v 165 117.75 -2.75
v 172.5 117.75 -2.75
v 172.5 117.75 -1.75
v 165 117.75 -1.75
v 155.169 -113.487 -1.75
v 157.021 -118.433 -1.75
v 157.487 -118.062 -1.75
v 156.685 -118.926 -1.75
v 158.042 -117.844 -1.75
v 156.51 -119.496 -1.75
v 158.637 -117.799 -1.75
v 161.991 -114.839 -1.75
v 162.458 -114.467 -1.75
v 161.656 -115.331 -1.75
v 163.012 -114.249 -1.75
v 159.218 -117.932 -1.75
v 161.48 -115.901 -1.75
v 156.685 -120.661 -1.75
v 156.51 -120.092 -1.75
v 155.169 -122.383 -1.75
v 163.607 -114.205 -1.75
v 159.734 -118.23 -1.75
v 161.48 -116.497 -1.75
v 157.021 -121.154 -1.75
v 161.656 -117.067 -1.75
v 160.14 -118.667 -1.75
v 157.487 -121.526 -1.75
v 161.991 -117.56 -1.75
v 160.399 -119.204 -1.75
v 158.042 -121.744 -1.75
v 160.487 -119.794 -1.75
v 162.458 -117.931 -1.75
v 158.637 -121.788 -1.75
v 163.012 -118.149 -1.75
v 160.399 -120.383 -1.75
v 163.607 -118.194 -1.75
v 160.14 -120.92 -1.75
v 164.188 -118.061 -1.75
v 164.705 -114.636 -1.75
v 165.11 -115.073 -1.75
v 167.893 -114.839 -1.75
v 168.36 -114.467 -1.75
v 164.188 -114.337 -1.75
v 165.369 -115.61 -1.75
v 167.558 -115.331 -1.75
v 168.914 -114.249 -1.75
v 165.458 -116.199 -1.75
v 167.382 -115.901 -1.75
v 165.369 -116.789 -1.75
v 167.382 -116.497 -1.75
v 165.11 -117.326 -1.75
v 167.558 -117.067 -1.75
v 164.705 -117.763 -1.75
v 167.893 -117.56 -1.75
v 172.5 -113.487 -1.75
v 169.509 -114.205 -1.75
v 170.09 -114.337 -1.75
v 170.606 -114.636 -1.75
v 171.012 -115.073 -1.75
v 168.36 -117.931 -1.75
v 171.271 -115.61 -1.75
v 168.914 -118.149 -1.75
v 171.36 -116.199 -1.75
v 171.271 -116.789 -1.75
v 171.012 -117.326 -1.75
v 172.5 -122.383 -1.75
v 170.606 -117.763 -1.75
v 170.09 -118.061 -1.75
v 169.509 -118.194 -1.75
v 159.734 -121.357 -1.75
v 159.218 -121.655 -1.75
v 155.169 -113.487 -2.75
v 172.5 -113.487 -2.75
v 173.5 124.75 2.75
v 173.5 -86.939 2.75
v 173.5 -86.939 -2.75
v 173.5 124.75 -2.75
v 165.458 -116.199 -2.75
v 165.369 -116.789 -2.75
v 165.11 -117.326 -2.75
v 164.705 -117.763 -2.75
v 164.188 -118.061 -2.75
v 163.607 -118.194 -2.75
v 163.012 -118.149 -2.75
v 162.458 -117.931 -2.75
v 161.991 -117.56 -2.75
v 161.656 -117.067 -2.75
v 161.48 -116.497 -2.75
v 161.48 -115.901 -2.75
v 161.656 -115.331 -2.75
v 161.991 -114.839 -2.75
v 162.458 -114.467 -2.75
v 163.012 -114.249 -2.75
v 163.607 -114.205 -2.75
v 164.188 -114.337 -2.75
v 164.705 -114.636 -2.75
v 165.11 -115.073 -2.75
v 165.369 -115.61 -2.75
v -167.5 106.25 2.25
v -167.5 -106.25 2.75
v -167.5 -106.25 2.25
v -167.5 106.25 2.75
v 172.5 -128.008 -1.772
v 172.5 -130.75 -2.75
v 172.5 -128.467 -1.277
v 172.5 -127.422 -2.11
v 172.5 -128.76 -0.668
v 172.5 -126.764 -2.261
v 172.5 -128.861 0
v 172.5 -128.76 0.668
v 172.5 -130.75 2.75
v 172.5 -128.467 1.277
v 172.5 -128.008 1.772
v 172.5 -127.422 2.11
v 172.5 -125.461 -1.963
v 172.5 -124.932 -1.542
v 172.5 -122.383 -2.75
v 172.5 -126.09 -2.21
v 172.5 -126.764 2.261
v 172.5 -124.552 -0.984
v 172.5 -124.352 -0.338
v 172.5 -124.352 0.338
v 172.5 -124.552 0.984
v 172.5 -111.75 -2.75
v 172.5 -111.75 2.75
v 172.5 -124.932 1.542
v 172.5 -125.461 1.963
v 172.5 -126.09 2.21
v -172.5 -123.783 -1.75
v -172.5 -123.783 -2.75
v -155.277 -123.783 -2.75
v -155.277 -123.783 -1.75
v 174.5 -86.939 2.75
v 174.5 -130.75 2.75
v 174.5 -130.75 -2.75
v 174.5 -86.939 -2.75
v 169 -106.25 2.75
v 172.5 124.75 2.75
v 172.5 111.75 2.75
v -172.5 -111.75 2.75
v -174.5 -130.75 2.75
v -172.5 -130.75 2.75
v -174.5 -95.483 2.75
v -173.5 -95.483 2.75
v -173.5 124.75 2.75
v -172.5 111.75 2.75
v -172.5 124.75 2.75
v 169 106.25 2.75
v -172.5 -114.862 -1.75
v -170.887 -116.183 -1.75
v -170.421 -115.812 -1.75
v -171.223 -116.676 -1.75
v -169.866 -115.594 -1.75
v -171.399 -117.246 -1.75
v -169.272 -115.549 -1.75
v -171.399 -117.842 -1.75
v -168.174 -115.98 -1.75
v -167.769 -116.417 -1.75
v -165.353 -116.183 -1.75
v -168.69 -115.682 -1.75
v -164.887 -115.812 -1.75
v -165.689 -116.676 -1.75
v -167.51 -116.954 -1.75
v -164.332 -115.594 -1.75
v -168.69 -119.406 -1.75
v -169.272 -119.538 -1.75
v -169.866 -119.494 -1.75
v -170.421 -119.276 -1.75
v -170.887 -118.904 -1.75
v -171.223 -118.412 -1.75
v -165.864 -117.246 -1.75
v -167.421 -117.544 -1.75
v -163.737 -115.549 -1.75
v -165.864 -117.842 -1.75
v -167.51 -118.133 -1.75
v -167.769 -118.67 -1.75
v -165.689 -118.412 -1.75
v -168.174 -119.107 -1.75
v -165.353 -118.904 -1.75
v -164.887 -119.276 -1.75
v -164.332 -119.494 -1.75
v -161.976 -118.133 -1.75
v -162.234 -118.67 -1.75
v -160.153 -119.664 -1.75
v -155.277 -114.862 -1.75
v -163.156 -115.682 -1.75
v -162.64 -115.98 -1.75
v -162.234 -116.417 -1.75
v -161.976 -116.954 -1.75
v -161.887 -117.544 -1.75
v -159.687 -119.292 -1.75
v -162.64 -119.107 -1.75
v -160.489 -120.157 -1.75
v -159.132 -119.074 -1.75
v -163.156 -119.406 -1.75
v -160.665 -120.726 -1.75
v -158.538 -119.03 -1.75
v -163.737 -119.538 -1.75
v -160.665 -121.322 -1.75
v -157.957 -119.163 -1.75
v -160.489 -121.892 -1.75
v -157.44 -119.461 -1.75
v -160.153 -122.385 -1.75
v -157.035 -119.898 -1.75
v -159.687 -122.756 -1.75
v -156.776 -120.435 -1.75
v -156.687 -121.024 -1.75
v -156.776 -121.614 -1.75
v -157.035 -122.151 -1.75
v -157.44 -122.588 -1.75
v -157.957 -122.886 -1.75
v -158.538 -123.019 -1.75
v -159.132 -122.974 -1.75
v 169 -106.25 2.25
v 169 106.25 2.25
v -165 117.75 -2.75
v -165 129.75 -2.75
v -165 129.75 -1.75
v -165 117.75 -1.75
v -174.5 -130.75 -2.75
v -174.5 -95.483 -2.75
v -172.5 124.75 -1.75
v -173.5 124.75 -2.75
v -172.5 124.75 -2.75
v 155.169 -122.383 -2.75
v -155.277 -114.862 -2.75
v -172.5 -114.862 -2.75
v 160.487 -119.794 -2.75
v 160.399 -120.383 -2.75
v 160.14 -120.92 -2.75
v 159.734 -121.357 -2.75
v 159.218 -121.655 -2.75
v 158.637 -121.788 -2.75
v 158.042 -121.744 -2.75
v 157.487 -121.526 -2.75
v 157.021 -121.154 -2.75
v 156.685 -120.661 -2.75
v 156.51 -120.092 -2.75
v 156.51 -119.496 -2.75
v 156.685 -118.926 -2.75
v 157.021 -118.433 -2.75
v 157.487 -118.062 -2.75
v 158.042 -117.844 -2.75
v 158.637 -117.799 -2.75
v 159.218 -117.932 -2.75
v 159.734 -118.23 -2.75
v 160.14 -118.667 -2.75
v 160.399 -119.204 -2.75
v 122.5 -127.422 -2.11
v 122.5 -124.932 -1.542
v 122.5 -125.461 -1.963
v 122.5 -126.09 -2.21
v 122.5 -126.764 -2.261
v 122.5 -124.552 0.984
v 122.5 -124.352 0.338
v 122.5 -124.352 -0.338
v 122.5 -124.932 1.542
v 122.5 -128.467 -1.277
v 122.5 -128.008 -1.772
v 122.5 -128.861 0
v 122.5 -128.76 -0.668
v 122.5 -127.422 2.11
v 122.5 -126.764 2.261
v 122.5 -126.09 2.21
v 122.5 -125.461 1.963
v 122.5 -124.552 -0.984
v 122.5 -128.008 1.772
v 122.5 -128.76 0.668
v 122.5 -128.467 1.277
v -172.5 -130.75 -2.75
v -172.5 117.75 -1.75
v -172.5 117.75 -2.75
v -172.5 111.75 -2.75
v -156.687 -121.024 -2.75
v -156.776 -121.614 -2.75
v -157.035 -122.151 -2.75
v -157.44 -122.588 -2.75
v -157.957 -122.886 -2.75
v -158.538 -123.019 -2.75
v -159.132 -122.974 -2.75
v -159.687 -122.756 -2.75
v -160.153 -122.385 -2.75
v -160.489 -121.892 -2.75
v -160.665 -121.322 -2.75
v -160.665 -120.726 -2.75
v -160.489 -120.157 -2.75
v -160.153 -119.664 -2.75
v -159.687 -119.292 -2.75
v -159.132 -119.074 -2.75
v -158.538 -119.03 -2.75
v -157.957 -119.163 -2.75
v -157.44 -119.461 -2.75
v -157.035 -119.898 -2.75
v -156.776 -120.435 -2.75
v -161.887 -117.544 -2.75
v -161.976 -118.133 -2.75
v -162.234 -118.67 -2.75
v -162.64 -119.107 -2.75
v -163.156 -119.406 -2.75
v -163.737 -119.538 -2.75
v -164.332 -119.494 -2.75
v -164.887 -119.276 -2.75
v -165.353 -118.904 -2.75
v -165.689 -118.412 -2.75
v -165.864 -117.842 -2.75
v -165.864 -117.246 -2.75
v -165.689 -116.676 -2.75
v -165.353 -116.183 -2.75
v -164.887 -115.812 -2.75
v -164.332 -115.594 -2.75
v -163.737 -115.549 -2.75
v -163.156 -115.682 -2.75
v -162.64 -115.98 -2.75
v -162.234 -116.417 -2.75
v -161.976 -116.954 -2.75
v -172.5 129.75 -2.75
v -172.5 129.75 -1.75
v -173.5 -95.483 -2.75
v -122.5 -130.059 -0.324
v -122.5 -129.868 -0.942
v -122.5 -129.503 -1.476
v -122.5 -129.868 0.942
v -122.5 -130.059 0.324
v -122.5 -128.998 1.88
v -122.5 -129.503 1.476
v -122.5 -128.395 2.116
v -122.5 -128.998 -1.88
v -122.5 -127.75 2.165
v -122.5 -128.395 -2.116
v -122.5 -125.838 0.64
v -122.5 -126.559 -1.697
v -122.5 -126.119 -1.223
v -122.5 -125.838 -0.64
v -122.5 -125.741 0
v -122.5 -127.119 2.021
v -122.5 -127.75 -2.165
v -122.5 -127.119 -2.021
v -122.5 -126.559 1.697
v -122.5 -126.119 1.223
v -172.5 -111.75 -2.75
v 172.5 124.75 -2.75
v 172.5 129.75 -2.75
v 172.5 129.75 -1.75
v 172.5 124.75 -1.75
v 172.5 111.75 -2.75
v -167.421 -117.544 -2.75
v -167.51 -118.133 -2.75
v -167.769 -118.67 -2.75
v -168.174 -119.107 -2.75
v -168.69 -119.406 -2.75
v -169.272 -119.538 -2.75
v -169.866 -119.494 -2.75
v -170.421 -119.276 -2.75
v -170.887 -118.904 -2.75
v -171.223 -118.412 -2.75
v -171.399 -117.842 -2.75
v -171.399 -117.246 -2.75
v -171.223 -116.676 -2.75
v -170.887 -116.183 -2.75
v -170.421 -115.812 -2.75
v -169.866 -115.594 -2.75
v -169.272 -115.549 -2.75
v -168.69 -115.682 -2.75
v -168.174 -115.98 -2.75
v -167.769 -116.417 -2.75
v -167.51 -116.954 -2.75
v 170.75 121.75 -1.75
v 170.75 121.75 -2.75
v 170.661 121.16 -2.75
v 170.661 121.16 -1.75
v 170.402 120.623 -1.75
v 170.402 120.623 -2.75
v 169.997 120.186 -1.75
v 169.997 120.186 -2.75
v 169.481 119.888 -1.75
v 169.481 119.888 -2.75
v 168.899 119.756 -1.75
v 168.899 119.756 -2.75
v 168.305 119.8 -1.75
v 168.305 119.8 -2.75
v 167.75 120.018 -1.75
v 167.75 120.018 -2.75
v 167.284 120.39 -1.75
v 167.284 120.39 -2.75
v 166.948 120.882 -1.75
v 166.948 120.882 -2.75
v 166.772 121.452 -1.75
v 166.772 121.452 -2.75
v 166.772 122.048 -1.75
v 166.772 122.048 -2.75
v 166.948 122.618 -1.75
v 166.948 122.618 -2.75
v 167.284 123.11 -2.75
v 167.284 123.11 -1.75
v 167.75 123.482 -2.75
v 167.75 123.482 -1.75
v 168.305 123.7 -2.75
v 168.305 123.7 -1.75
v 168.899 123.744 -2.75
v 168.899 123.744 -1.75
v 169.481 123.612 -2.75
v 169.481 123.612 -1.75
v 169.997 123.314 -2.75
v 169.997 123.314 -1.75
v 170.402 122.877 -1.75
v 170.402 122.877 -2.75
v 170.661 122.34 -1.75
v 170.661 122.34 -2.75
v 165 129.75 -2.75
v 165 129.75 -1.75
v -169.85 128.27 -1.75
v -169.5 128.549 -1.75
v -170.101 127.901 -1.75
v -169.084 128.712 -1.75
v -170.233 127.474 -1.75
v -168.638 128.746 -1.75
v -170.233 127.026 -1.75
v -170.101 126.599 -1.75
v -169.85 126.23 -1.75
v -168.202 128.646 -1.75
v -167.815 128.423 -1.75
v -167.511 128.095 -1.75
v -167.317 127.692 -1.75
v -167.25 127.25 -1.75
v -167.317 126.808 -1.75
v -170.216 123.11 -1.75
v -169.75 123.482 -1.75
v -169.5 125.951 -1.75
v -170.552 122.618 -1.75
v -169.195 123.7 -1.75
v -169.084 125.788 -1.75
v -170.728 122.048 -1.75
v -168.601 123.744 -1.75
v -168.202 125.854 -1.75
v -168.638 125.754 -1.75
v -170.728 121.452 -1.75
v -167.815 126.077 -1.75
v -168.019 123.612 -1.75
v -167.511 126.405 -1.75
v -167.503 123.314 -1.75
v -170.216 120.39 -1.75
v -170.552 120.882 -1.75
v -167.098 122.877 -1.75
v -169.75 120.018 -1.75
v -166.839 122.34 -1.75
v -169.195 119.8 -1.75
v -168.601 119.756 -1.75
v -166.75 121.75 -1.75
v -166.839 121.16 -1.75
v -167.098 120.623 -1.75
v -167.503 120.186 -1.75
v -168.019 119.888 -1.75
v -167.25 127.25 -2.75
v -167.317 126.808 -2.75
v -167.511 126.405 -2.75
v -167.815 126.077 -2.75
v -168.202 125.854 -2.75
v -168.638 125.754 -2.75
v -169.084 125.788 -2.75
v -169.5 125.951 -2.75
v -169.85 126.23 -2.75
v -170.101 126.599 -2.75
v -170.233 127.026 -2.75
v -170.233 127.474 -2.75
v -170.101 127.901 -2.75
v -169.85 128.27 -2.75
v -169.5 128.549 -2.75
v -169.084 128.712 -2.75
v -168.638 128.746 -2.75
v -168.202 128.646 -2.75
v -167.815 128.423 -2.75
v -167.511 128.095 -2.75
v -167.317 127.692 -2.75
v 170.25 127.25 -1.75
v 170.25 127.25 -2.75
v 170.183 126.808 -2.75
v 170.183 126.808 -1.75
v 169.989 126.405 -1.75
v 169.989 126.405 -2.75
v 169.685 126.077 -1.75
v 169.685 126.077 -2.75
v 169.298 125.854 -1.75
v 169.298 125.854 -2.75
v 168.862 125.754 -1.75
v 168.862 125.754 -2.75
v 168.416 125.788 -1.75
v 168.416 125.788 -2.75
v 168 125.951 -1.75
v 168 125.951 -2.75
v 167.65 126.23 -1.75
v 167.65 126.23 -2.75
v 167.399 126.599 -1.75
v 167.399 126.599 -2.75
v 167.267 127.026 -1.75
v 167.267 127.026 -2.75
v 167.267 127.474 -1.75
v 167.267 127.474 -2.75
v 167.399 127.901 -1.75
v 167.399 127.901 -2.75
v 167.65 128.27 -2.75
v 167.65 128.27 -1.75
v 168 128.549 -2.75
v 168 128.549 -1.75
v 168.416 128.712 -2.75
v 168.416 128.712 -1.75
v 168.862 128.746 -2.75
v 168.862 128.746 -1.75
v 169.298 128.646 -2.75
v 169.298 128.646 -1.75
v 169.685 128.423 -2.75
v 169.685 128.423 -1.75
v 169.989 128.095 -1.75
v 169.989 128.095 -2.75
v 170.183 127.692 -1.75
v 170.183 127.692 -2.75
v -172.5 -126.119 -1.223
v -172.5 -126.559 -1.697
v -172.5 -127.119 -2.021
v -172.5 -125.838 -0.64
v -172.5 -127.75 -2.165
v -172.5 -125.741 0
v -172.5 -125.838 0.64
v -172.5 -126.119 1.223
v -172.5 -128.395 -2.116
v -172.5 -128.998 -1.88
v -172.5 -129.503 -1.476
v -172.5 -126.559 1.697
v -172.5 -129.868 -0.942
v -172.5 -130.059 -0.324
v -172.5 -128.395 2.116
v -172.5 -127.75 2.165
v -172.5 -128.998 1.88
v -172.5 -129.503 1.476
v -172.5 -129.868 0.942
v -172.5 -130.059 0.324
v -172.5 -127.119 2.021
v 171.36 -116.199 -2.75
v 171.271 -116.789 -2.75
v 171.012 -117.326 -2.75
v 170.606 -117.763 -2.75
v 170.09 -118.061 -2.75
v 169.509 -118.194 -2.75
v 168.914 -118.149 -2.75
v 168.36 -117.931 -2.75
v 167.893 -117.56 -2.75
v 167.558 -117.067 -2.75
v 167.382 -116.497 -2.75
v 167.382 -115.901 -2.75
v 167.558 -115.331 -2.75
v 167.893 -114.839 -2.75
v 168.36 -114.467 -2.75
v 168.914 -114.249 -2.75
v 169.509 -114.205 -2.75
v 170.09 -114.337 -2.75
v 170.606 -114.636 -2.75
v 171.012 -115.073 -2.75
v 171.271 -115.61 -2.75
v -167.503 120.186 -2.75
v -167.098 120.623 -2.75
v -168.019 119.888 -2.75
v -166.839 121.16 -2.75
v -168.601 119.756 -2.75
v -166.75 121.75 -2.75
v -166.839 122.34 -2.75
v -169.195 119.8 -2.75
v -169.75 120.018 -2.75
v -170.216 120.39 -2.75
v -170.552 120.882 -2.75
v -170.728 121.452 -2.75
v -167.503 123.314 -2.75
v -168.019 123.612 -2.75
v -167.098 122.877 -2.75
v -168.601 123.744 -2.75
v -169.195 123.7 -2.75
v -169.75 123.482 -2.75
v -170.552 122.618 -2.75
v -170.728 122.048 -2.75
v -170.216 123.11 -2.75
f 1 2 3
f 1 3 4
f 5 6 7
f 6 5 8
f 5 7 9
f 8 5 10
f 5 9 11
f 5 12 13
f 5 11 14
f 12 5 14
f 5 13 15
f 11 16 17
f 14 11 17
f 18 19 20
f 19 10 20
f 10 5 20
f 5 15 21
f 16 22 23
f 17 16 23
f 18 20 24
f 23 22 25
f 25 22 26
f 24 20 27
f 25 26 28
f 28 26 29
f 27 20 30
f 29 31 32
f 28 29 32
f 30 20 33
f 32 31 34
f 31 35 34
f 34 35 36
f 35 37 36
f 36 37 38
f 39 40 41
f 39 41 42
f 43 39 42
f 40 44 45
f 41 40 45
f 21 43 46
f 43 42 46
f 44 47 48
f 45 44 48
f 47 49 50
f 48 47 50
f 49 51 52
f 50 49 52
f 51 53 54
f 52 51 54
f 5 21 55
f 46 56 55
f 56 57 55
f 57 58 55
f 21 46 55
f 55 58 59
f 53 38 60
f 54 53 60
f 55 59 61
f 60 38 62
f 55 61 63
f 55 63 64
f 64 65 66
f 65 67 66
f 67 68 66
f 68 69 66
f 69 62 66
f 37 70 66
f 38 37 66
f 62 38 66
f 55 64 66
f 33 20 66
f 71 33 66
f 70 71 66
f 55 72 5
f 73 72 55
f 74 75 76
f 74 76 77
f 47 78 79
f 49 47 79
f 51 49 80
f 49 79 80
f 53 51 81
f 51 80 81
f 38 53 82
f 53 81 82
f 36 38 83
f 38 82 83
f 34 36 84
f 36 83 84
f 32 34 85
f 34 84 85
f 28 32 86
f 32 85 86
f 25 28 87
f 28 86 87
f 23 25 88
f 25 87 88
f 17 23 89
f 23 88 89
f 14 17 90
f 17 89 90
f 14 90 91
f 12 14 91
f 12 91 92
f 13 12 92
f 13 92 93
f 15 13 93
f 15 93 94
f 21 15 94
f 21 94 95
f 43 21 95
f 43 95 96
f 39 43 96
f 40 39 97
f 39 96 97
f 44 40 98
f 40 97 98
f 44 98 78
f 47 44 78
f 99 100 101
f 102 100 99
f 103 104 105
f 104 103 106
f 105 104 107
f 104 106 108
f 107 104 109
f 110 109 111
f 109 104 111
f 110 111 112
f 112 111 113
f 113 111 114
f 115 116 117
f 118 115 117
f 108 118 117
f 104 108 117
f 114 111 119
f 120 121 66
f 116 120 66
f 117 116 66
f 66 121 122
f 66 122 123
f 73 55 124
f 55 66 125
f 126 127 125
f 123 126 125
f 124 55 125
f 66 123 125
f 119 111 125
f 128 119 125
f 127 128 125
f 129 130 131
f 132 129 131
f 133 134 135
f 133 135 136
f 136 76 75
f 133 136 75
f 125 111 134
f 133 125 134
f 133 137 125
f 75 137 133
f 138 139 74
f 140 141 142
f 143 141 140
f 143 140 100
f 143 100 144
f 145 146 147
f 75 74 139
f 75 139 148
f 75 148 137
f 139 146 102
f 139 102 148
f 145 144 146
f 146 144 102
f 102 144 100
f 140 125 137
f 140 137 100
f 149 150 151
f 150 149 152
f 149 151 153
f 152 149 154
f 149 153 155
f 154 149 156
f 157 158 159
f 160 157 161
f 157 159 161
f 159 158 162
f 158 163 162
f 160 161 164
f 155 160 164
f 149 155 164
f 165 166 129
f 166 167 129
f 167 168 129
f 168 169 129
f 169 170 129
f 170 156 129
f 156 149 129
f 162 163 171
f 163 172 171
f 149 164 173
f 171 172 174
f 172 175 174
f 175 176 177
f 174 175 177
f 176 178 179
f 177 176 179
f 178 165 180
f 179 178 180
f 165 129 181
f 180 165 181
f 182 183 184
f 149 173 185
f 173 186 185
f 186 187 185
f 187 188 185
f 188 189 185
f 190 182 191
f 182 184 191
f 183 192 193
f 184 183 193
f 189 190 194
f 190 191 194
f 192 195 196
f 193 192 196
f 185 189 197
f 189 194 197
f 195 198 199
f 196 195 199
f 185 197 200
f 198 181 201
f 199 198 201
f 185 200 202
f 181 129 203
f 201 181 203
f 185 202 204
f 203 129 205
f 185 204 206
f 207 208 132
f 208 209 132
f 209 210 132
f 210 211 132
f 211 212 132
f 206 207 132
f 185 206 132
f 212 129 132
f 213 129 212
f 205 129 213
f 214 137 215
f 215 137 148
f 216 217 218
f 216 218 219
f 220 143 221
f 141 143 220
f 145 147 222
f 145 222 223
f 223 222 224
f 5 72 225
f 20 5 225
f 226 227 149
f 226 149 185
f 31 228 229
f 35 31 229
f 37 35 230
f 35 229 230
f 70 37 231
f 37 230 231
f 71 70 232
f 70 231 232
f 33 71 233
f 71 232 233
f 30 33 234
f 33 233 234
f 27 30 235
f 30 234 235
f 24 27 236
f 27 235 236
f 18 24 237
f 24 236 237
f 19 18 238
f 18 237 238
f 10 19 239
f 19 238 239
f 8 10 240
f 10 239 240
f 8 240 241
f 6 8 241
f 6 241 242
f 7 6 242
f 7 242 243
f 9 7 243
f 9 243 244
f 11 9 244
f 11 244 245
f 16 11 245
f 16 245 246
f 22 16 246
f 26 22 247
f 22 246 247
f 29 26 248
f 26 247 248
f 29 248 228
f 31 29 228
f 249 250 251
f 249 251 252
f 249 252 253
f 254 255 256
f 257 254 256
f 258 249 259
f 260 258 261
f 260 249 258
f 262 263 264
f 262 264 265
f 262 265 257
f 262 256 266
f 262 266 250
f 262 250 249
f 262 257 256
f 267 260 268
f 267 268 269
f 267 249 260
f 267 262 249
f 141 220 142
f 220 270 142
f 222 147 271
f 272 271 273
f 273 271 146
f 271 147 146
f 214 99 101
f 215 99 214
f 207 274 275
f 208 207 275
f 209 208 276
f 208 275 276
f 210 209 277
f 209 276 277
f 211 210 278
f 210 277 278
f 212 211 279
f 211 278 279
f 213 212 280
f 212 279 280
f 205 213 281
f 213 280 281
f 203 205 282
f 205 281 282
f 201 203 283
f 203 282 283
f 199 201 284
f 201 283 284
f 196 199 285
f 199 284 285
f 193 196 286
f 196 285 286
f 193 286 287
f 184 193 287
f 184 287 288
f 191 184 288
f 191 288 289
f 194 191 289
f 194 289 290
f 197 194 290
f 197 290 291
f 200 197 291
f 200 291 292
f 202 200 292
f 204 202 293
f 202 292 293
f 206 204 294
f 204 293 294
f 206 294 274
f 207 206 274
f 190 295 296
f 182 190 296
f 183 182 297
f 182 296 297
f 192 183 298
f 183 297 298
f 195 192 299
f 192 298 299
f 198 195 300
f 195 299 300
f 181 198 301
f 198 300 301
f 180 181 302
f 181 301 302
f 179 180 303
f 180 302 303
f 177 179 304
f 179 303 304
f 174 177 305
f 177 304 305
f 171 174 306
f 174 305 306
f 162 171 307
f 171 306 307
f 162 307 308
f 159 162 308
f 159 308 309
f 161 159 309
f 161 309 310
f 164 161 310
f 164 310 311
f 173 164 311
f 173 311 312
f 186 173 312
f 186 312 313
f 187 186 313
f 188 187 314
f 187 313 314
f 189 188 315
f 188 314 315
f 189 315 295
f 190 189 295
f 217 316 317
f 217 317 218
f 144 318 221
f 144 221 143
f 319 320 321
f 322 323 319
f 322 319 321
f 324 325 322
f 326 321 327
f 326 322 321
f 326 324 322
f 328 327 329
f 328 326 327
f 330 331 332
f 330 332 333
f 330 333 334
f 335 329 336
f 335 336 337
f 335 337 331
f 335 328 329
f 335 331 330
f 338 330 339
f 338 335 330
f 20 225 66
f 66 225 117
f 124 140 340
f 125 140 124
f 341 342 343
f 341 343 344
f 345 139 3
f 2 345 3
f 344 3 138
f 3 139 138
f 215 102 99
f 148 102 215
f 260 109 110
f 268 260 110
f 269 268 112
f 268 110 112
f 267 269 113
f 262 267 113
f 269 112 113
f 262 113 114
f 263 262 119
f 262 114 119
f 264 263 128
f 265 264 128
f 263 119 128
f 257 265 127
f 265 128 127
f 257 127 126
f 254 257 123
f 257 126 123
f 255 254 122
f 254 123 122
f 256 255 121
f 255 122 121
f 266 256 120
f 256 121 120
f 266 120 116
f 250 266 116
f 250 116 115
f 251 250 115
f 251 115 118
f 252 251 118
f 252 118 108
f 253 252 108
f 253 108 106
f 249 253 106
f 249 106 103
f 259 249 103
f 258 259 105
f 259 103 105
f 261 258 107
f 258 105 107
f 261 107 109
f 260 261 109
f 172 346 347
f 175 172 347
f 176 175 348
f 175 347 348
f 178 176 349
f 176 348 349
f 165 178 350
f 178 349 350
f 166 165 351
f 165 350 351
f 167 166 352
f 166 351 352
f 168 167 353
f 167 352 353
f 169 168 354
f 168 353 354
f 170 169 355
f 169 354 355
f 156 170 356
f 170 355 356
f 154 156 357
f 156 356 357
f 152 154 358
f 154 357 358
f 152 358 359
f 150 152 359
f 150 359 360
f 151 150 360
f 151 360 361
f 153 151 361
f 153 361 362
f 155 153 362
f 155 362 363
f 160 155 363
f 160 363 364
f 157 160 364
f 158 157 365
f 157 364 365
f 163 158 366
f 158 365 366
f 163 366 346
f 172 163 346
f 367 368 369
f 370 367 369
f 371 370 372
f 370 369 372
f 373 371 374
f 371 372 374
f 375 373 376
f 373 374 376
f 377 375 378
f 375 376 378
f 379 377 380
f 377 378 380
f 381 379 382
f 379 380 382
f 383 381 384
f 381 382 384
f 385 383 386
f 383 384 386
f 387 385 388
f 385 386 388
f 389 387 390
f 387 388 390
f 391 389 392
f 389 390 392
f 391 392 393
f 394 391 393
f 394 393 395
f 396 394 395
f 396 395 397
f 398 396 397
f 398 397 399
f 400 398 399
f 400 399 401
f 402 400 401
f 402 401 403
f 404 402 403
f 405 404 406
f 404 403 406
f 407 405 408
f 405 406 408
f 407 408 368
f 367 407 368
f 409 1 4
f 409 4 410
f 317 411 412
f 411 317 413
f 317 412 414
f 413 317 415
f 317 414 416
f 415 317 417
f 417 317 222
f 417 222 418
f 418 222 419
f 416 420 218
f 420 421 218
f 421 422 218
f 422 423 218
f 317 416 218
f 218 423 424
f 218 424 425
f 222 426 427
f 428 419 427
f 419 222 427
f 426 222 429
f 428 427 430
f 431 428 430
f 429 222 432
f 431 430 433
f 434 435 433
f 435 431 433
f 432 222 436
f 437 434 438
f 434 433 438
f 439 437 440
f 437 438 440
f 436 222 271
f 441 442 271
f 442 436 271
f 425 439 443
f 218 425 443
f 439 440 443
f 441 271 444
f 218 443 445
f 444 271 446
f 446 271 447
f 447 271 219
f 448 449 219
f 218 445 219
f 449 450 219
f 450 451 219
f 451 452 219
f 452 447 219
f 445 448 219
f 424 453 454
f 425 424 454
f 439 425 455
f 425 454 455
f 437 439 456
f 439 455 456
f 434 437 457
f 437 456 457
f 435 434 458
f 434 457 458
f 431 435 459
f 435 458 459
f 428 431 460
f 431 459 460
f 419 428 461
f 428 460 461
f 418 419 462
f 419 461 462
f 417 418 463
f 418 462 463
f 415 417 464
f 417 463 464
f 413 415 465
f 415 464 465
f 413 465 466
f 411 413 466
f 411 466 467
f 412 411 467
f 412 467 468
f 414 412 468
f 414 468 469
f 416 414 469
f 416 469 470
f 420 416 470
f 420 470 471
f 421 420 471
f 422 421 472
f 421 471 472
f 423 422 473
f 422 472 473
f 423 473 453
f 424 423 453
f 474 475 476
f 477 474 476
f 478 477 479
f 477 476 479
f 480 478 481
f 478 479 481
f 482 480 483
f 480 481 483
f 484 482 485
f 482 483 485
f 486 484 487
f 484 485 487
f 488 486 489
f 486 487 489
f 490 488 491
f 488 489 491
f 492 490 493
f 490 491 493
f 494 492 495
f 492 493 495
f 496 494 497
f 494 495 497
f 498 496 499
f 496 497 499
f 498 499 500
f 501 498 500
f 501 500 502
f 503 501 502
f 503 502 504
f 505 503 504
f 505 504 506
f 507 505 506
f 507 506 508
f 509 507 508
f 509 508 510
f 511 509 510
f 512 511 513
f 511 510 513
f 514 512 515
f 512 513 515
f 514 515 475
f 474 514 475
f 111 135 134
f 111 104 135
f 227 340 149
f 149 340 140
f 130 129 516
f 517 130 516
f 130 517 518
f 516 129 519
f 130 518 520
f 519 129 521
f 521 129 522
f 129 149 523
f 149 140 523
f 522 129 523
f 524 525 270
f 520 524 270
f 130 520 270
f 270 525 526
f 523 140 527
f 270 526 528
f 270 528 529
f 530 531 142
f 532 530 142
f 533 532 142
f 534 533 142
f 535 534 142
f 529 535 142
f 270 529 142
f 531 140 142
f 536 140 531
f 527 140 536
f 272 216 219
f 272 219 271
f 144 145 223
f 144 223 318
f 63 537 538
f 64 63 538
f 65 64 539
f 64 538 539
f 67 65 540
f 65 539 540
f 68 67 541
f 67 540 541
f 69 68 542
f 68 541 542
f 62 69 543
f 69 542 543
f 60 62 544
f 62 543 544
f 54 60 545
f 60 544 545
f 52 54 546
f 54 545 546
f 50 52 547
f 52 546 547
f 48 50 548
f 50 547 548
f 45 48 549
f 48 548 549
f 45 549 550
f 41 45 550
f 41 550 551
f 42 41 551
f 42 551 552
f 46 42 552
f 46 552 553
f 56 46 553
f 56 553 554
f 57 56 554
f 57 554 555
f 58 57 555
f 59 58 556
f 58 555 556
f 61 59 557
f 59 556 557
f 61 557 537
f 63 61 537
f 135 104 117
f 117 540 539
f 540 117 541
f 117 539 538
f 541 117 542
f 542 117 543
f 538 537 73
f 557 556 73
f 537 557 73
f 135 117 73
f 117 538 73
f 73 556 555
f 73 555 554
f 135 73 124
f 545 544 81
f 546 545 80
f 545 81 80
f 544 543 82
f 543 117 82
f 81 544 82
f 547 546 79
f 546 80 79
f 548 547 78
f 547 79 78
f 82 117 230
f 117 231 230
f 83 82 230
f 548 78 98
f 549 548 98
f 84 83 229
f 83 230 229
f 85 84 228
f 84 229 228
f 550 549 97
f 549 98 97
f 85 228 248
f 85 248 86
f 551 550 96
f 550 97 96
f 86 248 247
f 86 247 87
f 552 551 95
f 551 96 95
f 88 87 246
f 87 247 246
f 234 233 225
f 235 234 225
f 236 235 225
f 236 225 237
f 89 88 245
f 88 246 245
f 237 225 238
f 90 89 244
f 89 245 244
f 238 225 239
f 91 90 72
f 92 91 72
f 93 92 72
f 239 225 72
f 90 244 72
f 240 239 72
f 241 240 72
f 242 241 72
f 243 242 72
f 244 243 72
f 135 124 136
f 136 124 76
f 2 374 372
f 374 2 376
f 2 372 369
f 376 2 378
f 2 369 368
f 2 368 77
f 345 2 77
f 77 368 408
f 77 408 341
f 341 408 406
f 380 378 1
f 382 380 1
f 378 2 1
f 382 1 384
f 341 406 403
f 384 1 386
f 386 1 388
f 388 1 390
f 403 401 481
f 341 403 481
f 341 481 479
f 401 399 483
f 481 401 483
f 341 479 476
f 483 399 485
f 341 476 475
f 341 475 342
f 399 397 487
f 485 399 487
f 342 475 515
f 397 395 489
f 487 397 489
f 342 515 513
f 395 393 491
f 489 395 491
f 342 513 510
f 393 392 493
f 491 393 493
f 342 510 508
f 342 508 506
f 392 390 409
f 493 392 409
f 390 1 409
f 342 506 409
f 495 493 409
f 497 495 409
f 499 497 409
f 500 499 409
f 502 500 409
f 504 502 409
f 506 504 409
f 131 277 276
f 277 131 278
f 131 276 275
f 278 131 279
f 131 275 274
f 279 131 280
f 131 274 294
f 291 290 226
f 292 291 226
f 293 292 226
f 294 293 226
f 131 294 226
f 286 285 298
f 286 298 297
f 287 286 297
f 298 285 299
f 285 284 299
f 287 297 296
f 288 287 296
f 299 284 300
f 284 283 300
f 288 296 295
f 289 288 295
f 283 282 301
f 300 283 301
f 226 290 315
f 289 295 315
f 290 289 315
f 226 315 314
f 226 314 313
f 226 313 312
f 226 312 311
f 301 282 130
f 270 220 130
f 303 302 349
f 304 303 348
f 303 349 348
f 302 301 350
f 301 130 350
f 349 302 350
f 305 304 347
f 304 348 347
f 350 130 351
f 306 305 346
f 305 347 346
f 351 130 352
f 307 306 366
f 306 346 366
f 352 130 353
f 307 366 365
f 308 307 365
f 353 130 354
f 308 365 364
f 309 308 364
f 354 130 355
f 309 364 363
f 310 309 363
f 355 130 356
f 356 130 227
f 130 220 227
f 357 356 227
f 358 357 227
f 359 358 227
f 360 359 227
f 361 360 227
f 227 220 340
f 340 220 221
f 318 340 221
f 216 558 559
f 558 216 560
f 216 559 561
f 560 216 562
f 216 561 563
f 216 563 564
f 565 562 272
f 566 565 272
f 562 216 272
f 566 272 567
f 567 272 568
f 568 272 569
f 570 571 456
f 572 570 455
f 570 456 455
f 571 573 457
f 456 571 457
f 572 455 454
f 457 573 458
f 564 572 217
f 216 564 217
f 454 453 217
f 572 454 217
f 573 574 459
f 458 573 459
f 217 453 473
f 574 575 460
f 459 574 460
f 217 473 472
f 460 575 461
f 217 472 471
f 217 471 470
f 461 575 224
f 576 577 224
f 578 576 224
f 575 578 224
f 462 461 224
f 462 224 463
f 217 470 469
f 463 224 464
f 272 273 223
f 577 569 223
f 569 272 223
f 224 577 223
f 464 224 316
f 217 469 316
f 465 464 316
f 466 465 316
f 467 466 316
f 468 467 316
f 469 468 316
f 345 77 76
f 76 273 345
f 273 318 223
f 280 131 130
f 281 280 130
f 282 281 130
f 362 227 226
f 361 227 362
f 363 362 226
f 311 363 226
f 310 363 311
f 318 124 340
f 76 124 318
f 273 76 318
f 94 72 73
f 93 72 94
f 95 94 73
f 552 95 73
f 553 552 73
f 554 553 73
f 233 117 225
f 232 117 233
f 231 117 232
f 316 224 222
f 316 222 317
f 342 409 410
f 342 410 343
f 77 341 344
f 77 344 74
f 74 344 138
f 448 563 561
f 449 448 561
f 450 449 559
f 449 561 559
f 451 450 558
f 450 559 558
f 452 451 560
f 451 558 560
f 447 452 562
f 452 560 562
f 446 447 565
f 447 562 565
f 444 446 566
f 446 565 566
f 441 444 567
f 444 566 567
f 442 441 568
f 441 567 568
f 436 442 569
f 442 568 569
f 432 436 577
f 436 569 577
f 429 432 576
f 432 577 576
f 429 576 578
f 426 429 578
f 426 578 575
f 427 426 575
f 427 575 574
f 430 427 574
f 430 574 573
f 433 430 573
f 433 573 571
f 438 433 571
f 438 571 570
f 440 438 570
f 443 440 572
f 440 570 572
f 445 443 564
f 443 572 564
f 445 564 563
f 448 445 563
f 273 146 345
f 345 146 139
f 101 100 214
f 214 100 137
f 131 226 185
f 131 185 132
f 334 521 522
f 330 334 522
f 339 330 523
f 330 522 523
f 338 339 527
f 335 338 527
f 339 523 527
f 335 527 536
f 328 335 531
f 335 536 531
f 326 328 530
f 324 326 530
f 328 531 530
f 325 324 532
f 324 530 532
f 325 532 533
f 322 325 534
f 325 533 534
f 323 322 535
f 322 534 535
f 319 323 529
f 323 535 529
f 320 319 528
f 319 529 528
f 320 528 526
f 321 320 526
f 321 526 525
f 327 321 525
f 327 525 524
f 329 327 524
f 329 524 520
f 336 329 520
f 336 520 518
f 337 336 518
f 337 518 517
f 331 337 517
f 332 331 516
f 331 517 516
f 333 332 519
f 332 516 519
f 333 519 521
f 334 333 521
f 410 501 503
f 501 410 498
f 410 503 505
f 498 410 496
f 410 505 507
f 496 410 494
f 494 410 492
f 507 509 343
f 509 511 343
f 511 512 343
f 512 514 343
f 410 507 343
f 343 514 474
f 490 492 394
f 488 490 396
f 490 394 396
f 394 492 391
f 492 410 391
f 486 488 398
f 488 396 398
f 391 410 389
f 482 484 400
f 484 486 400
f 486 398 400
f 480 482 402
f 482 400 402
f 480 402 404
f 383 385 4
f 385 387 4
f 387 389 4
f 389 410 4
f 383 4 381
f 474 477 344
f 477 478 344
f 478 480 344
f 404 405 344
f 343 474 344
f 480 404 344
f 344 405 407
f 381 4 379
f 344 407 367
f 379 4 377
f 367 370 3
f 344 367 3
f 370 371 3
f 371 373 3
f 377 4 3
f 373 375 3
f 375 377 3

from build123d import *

# Parameters (mm, degrees)
F0_W      = 345
F0_H      = 223.5
F1_DEPTH  = 2.75
F2_W      = 336.5
F2_H      = 212.5
F3_DEPTH  = 0.5
F5_DEPTH  = 1
F7_DEPTH  = 1
F8_R      = 1.5
F8_R_2    = 2
F9_DEPTH  = 1
F10_R     = 1.5
F10_R_2   = 2
F11_DEPTH = 1
F12_W     = 35.267069459
F12_H     = 5.5
F13_DEPTH = 1
F14_W     = 17.2233697499
F14_H     = 8.9206725706
F14_R     = 2
F15_DEPTH = 1
F16_R     = 2.1707267793
F17_DEPTH = 50
F18_W     = 43.8106725812
F18_H     = 5.5
F19_DEPTH = 1
F20_W     = 17.3314685191
F20_H     = 8.8958692735
F20_R     = 2
F21_DEPTH = 1
F22_R     = 2.2669992326
F23_DEPTH = 50


with BuildPart() as f1:
    # F0 (on Top) → F1 (new body, symmetric)
    with BuildSketch(Plane.XY):
        Rectangle(F0_W, F0_H)
    extrude(amount=F1_DEPTH, both=True)

    # F2 (on face) → F3 (cut)
    with BuildSketch(Plane.XY.offset(2.75)):
        with Locations((0.75, 0)):
            Rectangle(F2_W, F2_H)
    extrude(amount=-F3_DEPTH, mode=Mode.SUBTRACT)

    # F4 (on face) → F5 (join)
    with BuildSketch(Plane(origin=(-172.5, 0, 0), x_dir=(0, -1, 0), z_dir=(-1, 0, 0))):
        Polygon((-111.75, 2.75), (-124.75, 2.75), (-124.75, -2.75), (-111.75, -2.75), (111.75, -2.75), (130.75, -2.75), (130.75, 2.75), (111.75, 2.75), align=None)
    extrude(amount=F5_DEPTH)

    # F6 (on face) → F7 (join)
    with BuildSketch(Plane.YZ.offset(172.5)):
        Polygon((124.75, 2.75), (111.75, 2.75), (-111.75, 2.75), (-130.75, 2.75), (-130.75, -2.75), (-111.75, -2.75), (111.75, -2.75), (124.75, -2.75), align=None)
    extrude(amount=F7_DEPTH)

    # F8 (on face) → F9 (join)
    with BuildSketch(Plane(origin=(0, 0, -2.75), x_dir=(1, 0, 0), z_dir=(0, 0, -1))):
        Polygon((-172.5, -117.75), (-172.5, -124.75), (-172.5, -129.75), (-165, -129.75), (-165, -117.75), align=None)
        with Locations((-168.75, -127.25)):
            Circle(F8_R, mode=Mode.SUBTRACT)
        with Locations((-168.75, -121.75)):
            Circle(F8_R_2, mode=Mode.SUBTRACT)
    extrude(amount=-F9_DEPTH)

    # F10 (on face) → F11 (join)
    with BuildSketch(Plane(origin=(0, 0, -2.75), x_dir=(1, 0, 0), z_dir=(0, 0, -1))):
        Polygon((165, -117.75), (165, -129.75), (172.5, -129.75), (172.5, -124.75), (172.5, -117.75), align=None)
        with Locations((168.75, -127.25)):
            Circle(F10_R, mode=Mode.SUBTRACT)
        with Locations((168.75, -121.75)):
            Circle(F10_R_2, mode=Mode.SUBTRACT)
    extrude(amount=-F11_DEPTH)

    # F12 (on face) → F13 (join)
    with BuildSketch(Plane(origin=(-173.5, 0, 0), x_dir=(0, -1, 0), z_dir=(-1, 0, 0))):
        with Locations((113.1164652705, 0)):
            Rectangle(F12_W, F12_H)
    extrude(amount=F13_DEPTH)

    # F14 (on face) → F15 (join)
    with BuildSketch(Plane(origin=(0, 0, -2.75), x_dir=(1, 0, 0), z_dir=(0, 0, -1))):
        with Locations((-163.8883151251, 119.3223506039)):
            Rectangle(F14_W, F14_H)
        with Locations((-169.4210810497, 117.5438189247)):
            Circle(F14_R, mode=Mode.SUBTRACT)
        with Locations((-163.8866538361, 117.5438189247)):
            Circle(F14_R, mode=Mode.SUBTRACT)
        with Locations((-158.6872041225, 121.0242956877)):
            Circle(F14_R, mode=Mode.SUBTRACT)
    extrude(amount=-F15_DEPTH)

    # F16 (on face) → F17 (join)
    with BuildSketch(Plane.YZ.offset(-172.5)):
        with Locations((-127.9121488333, 0)):
            Circle(F16_R)
    extrude(amount=F17_DEPTH)

    # F18 (on face) → F19 (join)
    with BuildSketch(Plane.YZ.offset(173.5)):
        with Locations((-108.8446637094, 0)):
            Rectangle(F18_W, F18_H)
    extrude(amount=F19_DEPTH)

    # F20 (on face) → F21 (join)
    with BuildSketch(Plane(origin=(0, 0, -2.75), x_dir=(1, 0, 0), z_dir=(0, 0, -1))):
        with Locations((163.8342657404, 117.9346791002)):
            Rectangle(F20_W, F20_H)
        with Locations((163.4575277567, 116.1992102861)):
            Circle(F20_R, mode=Mode.SUBTRACT)
        with Locations((158.4874242544, 119.7936609387)):
            Circle(F20_R, mode=Mode.SUBTRACT)
        with Locations((169.3595200777, 116.1992102861)):
            Circle(F20_R, mode=Mode.SUBTRACT)
    extrude(amount=-F21_DEPTH)

    # F22 (on face) → F23 (join)
    with BuildSketch(Plane(origin=(172.5, 0, 0), x_dir=(0, -1, 0), z_dir=(-1, 0, 0))):
        with Locations((126.5941113234, 0)):
            Circle(F22_R)
    extrude(amount=F23_DEPTH)


solid = f1.part
